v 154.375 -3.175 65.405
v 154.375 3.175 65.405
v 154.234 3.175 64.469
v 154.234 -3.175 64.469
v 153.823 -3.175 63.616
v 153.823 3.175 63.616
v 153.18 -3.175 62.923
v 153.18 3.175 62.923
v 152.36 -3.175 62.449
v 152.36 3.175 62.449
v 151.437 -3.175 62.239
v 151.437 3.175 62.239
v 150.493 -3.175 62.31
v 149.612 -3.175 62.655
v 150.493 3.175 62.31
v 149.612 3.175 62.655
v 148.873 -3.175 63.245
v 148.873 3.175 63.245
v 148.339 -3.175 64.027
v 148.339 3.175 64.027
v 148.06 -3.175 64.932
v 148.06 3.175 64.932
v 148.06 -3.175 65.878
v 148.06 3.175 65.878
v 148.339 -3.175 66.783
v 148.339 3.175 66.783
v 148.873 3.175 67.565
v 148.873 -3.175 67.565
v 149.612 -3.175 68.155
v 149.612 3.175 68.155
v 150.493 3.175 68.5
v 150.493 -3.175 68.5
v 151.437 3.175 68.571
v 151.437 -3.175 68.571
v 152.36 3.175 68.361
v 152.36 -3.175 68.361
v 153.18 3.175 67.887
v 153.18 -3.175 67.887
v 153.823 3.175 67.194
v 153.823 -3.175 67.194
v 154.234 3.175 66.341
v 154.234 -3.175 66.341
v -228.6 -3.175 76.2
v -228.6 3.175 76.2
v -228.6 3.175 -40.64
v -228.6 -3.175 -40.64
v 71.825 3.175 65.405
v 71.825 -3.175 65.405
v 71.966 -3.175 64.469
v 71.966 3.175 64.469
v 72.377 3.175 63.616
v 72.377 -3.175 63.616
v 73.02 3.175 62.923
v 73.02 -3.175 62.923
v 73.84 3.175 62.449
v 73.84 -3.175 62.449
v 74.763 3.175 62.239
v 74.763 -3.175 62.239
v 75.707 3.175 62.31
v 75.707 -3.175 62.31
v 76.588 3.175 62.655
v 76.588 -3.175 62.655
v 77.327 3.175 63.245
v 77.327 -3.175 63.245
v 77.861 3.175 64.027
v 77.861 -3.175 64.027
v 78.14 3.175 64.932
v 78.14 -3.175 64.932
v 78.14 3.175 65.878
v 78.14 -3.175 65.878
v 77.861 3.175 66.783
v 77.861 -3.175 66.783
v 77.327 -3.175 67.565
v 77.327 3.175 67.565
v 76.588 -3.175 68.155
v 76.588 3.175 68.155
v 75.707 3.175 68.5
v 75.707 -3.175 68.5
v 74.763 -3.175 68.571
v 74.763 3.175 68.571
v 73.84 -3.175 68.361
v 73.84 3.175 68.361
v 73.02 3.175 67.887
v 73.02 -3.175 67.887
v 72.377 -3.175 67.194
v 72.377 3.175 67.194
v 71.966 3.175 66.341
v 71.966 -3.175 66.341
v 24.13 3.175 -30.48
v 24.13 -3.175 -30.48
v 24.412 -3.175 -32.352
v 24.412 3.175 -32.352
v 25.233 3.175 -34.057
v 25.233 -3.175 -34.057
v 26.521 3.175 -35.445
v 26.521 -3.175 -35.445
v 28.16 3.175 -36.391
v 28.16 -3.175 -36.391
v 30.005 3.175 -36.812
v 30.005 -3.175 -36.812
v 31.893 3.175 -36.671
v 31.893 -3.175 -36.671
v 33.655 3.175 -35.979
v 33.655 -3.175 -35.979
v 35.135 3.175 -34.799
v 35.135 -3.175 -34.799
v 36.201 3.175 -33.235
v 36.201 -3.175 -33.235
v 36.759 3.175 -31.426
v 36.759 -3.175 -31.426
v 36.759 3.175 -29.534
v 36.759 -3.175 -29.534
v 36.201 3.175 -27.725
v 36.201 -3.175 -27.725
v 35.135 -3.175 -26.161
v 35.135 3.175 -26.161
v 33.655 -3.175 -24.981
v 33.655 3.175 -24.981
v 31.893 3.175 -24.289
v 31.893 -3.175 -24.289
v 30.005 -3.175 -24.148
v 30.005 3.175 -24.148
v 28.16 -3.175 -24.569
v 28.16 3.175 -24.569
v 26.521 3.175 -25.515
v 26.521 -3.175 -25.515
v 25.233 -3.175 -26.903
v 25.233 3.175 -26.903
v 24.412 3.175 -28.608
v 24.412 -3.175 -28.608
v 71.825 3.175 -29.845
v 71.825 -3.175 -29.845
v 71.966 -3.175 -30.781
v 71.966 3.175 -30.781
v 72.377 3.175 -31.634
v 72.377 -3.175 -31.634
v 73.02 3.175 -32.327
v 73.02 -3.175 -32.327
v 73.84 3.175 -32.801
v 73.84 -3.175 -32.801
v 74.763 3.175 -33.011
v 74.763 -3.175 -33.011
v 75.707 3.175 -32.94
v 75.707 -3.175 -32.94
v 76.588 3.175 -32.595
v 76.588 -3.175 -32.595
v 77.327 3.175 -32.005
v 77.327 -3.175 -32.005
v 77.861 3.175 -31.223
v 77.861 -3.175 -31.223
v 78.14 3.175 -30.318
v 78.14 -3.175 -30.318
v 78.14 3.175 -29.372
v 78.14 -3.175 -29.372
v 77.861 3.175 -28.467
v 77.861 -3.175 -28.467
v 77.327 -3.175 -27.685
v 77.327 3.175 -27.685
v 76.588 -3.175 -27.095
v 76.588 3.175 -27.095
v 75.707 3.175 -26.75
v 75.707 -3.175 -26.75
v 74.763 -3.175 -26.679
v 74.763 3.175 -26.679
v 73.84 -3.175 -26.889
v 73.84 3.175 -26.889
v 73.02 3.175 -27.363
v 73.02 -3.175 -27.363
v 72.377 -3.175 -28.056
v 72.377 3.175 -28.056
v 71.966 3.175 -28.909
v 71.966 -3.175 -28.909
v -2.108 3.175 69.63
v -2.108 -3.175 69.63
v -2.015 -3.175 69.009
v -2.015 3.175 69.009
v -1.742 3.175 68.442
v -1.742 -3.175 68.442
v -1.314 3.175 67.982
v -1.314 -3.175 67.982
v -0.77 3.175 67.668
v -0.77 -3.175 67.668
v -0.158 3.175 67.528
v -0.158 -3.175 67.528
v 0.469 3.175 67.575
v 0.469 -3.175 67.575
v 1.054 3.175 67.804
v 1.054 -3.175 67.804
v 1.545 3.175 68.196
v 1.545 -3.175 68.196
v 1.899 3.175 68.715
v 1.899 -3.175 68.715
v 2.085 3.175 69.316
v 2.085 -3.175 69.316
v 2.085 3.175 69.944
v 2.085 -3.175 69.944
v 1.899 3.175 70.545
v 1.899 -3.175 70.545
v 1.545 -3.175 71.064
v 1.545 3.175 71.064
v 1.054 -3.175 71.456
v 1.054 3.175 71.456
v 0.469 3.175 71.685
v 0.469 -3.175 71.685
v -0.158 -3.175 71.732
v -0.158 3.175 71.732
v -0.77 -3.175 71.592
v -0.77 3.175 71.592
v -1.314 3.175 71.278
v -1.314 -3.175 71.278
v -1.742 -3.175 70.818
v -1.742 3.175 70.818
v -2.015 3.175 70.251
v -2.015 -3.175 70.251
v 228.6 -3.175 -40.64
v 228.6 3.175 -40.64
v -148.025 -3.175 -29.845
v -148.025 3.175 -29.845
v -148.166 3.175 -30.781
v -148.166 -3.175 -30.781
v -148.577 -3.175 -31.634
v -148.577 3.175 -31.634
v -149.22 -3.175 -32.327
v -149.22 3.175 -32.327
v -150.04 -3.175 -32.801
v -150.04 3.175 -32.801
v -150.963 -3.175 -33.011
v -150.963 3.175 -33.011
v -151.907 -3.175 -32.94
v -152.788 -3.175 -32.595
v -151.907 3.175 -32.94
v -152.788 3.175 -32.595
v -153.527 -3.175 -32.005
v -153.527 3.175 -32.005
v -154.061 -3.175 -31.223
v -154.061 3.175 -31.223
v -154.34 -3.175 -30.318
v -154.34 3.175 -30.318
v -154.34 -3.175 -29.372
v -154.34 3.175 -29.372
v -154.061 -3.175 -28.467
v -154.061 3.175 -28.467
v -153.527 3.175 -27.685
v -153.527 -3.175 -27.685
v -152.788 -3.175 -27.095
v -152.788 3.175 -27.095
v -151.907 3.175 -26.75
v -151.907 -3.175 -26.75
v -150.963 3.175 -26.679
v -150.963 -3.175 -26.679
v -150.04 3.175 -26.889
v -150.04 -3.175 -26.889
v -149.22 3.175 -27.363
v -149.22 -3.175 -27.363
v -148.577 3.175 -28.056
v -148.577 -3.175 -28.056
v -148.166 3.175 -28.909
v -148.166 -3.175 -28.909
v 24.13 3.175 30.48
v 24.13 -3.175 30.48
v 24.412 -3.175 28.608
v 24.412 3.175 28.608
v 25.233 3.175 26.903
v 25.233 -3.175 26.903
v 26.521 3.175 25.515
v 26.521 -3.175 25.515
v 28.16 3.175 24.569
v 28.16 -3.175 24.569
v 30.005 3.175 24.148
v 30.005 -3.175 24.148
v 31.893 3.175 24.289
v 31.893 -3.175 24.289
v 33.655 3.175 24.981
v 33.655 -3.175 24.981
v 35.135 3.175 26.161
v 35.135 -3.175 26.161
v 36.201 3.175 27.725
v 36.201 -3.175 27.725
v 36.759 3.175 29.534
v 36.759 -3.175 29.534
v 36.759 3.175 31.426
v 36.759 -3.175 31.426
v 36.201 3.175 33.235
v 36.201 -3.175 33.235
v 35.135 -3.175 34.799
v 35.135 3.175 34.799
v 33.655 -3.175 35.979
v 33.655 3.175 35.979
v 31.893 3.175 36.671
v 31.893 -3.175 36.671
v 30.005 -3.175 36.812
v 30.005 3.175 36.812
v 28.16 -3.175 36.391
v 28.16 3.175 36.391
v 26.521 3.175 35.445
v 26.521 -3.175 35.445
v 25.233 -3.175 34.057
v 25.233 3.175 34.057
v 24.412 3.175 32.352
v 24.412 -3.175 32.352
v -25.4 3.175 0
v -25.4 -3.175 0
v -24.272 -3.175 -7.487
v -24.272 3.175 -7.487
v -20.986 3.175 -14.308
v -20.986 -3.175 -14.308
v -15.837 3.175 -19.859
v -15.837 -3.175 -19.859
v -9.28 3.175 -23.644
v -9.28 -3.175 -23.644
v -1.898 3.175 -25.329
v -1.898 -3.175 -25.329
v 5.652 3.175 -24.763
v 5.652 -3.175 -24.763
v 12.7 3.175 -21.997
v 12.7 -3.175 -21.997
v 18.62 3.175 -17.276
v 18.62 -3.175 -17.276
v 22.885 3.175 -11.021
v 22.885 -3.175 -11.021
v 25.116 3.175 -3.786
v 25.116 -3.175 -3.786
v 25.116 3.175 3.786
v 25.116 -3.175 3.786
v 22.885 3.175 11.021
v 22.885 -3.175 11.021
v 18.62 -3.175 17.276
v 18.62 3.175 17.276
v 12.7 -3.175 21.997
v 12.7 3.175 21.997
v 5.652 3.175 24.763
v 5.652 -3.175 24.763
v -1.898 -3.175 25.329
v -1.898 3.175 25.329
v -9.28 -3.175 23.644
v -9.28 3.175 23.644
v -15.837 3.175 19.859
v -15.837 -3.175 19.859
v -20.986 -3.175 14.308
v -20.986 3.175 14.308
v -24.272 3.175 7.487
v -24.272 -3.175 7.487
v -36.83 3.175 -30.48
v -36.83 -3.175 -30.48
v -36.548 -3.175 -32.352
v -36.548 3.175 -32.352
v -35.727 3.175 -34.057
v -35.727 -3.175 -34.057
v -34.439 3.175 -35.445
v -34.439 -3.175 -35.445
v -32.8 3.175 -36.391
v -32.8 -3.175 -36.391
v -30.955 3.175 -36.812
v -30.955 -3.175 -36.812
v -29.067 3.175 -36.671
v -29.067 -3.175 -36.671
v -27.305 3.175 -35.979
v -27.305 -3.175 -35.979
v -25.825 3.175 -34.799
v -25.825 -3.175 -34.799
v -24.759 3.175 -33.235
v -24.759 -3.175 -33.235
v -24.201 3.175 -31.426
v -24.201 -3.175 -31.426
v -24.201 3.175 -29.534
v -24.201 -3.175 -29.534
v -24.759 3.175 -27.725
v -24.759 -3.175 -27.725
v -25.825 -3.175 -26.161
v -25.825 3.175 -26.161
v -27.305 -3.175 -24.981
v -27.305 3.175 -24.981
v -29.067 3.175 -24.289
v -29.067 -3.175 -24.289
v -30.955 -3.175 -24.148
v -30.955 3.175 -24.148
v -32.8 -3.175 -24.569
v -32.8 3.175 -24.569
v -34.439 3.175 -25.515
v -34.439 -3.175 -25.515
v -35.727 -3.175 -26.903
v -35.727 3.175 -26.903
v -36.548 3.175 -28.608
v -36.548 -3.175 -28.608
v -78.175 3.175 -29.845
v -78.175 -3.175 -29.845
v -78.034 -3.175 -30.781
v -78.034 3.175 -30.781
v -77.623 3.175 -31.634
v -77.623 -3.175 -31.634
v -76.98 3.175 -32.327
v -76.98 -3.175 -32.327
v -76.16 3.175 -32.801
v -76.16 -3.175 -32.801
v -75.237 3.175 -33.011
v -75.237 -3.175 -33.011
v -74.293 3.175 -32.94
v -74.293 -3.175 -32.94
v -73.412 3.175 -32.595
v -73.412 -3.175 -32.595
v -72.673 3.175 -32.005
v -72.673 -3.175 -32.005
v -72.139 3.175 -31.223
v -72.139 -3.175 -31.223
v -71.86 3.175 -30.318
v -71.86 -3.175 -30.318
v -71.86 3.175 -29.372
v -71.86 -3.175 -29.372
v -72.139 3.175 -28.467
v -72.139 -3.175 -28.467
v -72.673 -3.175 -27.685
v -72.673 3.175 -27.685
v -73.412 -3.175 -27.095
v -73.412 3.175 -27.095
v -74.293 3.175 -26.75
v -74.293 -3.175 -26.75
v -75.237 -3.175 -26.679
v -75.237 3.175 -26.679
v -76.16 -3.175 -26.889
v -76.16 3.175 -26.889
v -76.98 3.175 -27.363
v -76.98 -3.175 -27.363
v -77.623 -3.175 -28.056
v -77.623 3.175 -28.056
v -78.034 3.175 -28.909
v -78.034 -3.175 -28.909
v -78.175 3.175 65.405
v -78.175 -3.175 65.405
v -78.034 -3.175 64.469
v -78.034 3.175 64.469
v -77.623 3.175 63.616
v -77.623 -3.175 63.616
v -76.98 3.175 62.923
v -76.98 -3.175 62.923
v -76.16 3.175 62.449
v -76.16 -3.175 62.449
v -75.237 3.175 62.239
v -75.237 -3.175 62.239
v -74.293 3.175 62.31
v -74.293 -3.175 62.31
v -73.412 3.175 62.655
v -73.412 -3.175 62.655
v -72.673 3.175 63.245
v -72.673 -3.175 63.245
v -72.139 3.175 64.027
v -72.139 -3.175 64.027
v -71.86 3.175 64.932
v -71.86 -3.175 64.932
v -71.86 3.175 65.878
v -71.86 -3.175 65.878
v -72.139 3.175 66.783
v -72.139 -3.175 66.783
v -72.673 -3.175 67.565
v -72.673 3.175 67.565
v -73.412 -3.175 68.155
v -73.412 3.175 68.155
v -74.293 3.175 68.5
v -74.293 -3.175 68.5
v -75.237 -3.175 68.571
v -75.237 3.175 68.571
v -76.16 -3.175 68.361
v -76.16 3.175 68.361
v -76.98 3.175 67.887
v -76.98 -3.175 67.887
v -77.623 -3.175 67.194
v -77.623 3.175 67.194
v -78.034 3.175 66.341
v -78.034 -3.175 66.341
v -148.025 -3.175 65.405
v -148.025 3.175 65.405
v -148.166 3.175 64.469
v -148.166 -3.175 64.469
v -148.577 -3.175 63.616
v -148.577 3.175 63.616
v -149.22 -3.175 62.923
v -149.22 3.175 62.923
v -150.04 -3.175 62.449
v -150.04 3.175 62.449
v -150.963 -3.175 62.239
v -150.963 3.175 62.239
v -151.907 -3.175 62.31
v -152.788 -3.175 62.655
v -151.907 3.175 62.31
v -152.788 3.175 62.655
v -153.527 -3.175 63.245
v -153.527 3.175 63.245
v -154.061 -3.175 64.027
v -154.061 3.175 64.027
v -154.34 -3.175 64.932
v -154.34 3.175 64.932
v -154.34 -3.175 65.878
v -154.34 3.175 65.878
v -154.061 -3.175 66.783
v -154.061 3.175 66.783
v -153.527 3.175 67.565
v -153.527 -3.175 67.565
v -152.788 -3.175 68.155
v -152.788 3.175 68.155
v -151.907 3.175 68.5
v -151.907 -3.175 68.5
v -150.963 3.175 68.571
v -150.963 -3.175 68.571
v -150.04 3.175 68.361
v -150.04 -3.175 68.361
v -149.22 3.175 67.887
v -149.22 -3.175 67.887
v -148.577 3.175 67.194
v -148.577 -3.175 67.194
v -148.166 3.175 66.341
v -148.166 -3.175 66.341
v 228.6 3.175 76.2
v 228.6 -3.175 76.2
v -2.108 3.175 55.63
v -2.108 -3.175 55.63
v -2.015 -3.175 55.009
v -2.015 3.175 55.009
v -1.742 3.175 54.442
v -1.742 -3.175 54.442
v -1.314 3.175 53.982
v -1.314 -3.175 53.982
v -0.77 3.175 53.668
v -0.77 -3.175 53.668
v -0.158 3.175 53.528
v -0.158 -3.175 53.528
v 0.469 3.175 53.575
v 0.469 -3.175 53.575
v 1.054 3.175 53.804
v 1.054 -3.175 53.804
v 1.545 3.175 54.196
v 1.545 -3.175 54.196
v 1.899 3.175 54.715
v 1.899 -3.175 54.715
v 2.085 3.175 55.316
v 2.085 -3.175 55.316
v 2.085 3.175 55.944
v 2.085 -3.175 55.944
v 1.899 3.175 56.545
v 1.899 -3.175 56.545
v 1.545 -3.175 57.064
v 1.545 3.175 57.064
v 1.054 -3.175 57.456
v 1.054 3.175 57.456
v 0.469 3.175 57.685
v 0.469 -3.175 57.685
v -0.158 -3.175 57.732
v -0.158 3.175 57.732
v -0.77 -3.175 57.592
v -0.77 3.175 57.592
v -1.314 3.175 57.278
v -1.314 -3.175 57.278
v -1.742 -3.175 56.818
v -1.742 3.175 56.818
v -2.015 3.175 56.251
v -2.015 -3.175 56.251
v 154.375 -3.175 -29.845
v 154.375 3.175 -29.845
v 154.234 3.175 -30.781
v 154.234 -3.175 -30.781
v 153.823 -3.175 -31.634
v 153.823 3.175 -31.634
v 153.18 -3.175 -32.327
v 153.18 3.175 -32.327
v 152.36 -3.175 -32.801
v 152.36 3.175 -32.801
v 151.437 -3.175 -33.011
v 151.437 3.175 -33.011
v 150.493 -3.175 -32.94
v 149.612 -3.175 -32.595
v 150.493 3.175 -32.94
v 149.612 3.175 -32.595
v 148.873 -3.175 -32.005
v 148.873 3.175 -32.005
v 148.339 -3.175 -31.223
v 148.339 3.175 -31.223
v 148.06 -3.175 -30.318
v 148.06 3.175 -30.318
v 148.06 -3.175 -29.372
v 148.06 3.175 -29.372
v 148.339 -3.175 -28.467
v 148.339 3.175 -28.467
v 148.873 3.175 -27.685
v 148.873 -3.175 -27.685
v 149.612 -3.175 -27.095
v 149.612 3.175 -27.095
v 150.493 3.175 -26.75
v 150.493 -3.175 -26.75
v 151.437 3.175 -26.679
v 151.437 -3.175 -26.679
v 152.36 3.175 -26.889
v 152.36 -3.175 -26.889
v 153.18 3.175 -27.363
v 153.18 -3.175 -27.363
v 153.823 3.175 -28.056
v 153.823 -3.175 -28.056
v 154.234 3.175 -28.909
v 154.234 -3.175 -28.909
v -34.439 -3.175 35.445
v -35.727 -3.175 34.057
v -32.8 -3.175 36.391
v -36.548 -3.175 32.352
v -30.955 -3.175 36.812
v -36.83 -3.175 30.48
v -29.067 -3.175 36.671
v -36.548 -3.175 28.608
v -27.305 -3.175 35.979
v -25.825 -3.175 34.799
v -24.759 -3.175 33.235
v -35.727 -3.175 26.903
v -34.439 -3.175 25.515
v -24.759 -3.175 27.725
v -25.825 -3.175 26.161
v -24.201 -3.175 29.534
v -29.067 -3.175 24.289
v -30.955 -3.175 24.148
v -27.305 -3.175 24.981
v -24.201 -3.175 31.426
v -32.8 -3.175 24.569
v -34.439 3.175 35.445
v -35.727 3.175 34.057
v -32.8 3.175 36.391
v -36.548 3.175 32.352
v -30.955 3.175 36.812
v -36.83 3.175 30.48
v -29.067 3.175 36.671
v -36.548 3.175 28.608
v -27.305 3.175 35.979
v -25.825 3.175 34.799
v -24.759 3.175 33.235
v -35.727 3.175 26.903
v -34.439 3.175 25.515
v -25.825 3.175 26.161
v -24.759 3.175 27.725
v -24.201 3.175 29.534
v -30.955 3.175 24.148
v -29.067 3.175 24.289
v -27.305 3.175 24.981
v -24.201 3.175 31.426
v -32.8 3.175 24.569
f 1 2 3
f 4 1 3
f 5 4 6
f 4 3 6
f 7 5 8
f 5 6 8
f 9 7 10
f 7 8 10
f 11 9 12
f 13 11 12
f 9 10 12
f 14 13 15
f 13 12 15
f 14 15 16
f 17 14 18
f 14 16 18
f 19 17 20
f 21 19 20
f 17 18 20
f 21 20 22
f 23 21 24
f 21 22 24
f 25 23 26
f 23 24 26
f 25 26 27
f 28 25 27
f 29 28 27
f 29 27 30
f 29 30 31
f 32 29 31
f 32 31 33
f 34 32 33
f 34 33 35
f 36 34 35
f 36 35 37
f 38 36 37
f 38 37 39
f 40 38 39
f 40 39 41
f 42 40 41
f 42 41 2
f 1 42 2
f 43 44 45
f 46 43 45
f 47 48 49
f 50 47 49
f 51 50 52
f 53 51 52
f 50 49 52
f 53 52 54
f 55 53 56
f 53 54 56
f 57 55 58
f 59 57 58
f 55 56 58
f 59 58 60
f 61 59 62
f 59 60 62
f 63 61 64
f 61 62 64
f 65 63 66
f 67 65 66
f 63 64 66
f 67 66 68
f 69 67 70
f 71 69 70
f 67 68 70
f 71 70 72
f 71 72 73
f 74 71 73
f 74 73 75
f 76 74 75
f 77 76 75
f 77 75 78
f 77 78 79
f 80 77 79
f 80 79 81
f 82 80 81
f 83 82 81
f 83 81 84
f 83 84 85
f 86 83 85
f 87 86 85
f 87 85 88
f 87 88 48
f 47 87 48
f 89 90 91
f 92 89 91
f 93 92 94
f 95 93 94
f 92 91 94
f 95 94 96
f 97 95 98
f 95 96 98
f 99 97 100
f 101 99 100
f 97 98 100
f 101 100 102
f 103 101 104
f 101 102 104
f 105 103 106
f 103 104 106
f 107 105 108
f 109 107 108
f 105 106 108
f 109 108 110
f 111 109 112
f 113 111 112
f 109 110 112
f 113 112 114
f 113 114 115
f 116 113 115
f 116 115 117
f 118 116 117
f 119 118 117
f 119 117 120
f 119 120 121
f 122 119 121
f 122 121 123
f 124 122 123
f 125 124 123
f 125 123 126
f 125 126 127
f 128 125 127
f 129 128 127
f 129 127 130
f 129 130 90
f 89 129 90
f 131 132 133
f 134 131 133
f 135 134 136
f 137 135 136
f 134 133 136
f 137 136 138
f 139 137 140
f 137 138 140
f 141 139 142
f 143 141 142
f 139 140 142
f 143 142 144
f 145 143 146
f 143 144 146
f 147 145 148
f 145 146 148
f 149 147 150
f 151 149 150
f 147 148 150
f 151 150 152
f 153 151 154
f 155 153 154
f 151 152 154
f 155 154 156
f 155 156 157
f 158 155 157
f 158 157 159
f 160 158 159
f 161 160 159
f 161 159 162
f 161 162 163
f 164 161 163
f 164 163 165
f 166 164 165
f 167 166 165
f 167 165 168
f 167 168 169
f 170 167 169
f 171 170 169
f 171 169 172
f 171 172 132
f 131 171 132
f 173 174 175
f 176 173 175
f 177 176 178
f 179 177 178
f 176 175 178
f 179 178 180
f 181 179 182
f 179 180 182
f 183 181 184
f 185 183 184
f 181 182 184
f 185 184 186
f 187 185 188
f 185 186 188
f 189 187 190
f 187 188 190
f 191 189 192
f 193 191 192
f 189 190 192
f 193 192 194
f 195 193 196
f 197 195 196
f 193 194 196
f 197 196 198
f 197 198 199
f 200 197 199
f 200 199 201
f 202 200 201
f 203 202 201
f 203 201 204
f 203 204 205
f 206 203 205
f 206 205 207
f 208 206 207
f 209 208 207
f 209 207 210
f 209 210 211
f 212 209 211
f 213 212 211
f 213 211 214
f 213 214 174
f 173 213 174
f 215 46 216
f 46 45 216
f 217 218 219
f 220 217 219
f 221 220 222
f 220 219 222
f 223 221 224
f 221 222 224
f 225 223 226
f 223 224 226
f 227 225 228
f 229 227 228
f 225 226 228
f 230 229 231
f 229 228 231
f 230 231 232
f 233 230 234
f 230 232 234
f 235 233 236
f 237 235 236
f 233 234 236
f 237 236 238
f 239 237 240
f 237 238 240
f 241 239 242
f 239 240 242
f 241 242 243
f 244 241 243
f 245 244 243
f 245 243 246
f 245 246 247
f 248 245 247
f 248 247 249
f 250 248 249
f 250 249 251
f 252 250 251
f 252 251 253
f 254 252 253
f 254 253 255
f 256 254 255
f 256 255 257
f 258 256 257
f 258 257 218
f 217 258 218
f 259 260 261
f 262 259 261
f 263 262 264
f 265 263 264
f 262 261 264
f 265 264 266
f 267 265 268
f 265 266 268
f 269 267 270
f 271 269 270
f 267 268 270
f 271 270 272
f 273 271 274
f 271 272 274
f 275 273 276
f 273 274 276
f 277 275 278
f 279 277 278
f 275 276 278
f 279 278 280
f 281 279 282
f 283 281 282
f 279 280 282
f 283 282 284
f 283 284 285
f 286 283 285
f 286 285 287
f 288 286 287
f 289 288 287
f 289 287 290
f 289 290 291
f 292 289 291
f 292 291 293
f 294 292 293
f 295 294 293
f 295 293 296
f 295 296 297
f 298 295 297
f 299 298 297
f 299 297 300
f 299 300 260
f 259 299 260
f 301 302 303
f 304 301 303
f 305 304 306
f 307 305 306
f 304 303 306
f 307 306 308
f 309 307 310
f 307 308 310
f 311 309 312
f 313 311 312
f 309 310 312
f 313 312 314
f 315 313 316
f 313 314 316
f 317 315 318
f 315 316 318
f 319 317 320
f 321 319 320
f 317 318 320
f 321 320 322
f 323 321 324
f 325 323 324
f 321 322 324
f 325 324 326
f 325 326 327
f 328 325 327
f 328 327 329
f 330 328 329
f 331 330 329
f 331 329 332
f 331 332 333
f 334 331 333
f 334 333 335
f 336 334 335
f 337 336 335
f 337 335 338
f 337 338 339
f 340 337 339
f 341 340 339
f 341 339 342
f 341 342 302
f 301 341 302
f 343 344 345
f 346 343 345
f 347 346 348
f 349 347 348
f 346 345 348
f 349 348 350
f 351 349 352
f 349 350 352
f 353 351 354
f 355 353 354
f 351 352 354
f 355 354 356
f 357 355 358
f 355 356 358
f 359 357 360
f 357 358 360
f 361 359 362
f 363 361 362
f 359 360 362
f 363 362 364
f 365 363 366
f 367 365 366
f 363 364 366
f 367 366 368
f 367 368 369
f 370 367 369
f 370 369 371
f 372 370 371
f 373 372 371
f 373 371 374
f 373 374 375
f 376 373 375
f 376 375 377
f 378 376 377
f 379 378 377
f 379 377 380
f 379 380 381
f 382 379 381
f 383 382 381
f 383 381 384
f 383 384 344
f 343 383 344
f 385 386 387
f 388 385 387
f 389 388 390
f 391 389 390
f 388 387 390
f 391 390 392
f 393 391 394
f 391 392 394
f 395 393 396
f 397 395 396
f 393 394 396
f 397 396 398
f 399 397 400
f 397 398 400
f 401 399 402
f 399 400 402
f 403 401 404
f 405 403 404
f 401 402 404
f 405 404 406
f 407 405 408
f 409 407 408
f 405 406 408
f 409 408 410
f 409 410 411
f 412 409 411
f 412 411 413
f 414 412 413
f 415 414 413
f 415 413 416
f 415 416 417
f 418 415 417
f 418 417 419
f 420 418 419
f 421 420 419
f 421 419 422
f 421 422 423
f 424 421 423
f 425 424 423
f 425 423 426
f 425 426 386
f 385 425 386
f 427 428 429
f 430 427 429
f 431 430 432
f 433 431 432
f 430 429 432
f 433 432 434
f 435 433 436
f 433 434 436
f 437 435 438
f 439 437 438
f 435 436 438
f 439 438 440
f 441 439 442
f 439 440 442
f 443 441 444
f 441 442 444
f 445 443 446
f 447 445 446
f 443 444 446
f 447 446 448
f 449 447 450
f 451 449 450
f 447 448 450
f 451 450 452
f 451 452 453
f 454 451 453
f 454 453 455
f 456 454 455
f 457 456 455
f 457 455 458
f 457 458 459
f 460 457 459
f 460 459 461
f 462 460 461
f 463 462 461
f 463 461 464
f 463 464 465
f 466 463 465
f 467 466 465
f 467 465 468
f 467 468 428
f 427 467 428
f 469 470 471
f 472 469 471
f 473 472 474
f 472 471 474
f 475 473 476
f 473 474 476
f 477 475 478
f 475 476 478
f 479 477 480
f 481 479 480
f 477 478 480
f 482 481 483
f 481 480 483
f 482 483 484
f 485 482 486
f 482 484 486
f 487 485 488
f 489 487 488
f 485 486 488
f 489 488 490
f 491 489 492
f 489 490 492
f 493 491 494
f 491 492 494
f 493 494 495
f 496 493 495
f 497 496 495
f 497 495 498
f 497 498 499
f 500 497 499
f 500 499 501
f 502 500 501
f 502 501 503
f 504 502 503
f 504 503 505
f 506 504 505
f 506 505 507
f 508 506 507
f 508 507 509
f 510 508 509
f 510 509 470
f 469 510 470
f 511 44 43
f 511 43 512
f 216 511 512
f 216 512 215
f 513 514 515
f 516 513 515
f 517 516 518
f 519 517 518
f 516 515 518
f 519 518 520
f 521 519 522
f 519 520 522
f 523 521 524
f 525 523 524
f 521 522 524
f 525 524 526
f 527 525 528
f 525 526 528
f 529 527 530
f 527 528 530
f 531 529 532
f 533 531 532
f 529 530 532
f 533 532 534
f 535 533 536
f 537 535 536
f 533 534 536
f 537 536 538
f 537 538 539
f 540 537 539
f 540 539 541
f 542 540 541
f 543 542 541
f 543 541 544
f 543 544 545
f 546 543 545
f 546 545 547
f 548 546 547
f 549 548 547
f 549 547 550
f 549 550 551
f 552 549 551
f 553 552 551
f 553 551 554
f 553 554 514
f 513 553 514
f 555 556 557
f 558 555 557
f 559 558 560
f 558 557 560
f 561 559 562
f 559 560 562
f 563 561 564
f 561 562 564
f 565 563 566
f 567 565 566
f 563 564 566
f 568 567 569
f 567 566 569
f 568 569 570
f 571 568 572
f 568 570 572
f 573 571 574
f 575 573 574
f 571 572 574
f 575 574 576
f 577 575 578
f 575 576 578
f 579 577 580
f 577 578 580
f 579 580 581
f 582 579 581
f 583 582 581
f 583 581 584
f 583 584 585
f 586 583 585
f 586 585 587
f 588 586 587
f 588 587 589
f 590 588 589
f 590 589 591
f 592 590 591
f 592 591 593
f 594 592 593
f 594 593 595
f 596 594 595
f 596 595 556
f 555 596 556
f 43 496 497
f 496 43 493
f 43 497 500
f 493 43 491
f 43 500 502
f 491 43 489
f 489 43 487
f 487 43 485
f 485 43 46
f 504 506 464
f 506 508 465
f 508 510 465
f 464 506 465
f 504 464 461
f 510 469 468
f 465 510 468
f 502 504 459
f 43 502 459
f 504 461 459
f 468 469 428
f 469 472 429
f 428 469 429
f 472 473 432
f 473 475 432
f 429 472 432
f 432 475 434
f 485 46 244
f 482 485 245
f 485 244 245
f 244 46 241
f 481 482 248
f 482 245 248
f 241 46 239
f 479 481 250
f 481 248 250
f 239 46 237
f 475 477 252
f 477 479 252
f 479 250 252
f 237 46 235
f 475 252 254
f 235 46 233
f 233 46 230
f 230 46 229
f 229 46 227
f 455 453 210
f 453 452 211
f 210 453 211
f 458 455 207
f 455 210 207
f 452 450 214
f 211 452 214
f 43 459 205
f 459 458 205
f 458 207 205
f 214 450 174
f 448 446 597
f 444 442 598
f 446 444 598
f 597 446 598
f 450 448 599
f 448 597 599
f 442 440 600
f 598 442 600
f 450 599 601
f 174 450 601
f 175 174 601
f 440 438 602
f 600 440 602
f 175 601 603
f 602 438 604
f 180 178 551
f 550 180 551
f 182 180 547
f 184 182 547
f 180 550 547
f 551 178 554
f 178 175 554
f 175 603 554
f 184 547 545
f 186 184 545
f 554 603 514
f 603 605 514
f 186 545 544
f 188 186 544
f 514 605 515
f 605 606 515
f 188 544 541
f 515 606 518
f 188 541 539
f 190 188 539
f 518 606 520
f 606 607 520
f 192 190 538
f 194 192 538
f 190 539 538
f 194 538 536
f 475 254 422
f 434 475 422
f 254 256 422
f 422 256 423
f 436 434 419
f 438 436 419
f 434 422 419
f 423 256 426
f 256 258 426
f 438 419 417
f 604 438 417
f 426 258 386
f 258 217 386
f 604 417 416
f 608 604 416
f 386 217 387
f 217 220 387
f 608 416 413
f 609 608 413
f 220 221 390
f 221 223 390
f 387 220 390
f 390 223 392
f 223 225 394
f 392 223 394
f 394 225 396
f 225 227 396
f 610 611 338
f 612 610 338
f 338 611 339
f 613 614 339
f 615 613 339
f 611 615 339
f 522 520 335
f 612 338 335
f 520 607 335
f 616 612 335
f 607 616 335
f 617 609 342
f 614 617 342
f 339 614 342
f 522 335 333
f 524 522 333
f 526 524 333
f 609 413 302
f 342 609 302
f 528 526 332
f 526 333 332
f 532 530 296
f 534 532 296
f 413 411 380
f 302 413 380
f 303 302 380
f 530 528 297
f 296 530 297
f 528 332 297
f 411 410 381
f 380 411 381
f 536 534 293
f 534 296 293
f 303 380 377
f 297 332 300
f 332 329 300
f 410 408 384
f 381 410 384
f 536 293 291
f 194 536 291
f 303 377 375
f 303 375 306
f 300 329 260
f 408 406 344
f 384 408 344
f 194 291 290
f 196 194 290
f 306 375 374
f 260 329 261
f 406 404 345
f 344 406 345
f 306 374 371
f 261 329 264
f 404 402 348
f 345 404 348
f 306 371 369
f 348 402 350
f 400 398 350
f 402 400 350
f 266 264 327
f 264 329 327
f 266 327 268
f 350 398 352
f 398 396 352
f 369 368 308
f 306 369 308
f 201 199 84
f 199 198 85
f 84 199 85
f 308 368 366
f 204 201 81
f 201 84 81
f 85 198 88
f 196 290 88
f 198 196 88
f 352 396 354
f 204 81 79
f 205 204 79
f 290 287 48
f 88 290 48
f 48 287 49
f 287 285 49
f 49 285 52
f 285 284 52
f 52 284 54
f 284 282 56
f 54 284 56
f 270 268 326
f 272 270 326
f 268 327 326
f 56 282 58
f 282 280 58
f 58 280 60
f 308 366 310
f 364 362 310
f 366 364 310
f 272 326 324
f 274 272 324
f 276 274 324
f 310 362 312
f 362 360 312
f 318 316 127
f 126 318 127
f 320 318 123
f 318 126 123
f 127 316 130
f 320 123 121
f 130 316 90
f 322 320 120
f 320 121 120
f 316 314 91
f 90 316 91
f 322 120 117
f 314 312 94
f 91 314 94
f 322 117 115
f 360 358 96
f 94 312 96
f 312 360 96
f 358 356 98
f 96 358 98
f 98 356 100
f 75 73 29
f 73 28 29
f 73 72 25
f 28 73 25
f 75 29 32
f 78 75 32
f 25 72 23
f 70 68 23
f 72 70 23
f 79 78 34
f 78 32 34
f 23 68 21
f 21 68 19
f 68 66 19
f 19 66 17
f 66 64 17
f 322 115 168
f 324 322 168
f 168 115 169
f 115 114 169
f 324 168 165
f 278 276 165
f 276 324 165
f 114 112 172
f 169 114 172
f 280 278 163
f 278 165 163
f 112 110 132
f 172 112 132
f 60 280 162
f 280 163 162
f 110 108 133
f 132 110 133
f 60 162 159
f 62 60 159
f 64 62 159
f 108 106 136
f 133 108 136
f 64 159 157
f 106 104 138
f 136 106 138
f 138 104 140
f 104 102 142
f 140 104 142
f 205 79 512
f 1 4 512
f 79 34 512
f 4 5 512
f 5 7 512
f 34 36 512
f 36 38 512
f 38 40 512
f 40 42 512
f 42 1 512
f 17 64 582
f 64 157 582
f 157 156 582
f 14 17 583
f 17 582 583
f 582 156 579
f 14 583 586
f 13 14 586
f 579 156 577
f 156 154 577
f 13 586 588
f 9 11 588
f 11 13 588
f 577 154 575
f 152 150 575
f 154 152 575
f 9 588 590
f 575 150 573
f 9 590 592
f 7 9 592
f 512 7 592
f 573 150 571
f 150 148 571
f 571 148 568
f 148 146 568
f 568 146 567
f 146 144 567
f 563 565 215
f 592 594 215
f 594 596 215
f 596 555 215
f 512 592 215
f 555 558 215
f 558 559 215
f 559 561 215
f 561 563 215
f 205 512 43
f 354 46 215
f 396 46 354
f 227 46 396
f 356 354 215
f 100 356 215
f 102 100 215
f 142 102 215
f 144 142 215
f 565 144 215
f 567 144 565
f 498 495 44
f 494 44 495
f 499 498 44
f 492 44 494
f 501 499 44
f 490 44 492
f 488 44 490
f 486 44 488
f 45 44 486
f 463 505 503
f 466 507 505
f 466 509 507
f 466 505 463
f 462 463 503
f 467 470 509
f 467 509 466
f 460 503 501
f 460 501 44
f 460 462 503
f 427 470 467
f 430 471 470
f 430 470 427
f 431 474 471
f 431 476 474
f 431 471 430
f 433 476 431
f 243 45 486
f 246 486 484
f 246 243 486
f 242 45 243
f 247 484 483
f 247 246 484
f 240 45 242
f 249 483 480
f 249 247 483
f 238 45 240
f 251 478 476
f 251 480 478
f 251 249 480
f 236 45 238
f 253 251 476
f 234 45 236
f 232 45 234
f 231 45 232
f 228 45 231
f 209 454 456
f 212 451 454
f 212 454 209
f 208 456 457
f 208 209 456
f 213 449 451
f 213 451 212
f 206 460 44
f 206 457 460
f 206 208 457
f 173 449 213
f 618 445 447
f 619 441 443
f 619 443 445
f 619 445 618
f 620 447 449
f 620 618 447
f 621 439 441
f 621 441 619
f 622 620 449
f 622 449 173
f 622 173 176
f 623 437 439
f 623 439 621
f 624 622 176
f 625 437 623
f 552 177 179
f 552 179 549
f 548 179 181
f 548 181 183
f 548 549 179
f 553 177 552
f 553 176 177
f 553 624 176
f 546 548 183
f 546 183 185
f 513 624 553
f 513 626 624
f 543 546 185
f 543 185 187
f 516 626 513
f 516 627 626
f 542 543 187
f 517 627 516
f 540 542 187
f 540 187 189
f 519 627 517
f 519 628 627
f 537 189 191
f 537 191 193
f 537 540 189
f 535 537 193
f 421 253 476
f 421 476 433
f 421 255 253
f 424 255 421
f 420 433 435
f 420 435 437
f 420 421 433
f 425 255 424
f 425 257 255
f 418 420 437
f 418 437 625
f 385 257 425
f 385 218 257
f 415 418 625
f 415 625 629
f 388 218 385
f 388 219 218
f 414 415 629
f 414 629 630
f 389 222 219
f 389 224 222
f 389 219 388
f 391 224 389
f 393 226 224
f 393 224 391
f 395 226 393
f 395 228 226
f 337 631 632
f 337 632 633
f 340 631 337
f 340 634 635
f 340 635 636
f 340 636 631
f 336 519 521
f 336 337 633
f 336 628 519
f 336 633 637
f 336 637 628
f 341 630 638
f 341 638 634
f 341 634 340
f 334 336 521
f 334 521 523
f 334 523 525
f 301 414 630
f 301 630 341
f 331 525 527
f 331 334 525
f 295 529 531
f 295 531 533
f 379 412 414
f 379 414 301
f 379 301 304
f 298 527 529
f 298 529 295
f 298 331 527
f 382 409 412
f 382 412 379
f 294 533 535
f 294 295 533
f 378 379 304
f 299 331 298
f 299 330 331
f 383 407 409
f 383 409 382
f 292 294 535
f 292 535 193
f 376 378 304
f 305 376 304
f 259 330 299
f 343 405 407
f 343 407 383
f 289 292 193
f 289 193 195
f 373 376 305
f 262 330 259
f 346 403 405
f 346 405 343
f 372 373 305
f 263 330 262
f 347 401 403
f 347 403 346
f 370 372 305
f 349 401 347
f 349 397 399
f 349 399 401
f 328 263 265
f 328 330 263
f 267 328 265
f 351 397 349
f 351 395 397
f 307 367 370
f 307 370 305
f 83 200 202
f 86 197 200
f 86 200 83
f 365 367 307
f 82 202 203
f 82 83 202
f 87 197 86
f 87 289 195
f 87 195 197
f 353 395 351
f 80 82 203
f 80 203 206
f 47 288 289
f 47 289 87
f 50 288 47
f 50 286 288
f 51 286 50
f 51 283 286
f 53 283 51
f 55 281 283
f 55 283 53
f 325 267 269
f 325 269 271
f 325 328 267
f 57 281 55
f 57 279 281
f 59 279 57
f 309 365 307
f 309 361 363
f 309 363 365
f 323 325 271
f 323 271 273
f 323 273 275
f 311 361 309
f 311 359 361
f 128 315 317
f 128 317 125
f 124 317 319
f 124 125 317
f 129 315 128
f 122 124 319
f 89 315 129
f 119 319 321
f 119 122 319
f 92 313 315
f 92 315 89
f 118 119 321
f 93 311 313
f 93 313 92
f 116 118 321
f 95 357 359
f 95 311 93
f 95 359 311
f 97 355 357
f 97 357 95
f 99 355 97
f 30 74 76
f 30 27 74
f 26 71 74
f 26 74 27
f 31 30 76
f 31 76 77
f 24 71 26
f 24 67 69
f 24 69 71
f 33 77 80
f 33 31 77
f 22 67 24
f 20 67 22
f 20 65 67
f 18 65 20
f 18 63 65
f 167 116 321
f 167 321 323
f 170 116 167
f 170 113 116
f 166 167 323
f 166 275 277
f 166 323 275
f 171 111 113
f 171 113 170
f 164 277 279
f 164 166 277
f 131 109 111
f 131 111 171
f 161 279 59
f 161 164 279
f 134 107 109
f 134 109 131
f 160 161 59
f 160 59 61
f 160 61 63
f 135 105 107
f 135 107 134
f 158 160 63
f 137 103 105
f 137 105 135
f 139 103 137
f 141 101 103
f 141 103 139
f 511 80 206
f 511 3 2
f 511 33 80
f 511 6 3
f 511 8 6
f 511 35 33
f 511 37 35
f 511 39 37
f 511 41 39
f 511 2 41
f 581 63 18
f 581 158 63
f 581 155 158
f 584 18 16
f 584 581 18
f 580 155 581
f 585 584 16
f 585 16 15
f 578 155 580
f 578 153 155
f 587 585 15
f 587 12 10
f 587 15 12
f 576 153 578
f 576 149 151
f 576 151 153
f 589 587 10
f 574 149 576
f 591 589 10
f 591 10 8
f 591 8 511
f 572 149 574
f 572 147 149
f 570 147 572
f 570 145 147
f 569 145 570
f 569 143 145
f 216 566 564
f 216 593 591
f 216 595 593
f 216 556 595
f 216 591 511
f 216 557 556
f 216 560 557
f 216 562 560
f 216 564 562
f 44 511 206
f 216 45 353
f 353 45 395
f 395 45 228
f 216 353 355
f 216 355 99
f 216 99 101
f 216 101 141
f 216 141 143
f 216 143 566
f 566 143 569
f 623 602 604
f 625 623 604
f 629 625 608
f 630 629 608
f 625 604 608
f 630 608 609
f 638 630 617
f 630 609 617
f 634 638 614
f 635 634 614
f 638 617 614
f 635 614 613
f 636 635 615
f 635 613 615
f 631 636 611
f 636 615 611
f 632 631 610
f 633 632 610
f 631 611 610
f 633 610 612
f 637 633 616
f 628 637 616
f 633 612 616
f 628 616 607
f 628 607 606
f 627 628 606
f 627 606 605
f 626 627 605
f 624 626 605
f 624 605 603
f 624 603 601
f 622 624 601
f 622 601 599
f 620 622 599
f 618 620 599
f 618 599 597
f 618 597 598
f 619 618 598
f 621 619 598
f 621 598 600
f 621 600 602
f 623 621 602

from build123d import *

# Parameters (mm, degrees)
SKETCH1_W                   = 457.2
SKETCH1_H                   = 116.84
BOSS_EXTRUDE1_DEPTH         = 3.175
F_1_1_DIAMETER_HOLE1_D      = 50.8
F_1_2_0_5_DIAMETER_HOLE1_D  = 12.7
F_4_0_4_DIAMETER_HOLE1_D    = 4.2164
F_1_4_0_25_DIAMETER_HOLE1_D = 6.35
AUX_CLEARANCE_HOLES_REACH   = 8.35
SKETCH11_R                  = 3.175


with BuildPart() as part:
    # Sketch1 → Boss-Extrude1 (new body, symmetric)
    with BuildSketch(Plane(origin=(0, 0, 0), x_dir=(1, 0, 0), z_dir=(0, 1, 0))):
        with Locations((0, -17.78)):
            Rectangle(SKETCH1_W, SKETCH1_H)
    extrude(amount=BOSS_EXTRUDE1_DEPTH, both=True)

    # 1 (1) Diameter Hole1 (through all)
    with Locations(Plane(origin=(0, 3.175, 0), x_dir=(1, 0, 0), z_dir=(0, 1, 0))):
        with Locations((0, 0)):
            Hole(F_1_1_DIAMETER_HOLE1_D / 2)

    # 1/2 (0.5) Diameter Hole1 (through all)
    with Locations(Plane(origin=(0, 3.175, 0), x_dir=(1, 0, 0), z_dir=(0, 1, 0))):
        with Locations((30.48, -30.48), (-30.48, 30.48), (-30.48, -30.48), (30.48, 30.48)):
            Hole(F_1_2_0_5_DIAMETER_HOLE1_D / 2)

    # Ø4.0 (4) Diameter Hole1 (through all)
    with Locations(Plane(origin=(0, 3.175, 0), x_dir=(1, 0, 0), z_dir=(0, 1, 0))):
        with Locations((0, -55.63), (0, -69.63)):
            Hole(F_4_0_4_DIAMETER_HOLE1_D / 2)

    # 1/4 (0.25) Diameter Hole1 (through all)
    with Locations(Plane(origin=(0, 3.175, 0), x_dir=(1, 0, 0), z_dir=(0, 1, 0))):
        with Locations((75, -65.405), (-75, 29.845), (-75, -65.405), (75, 29.845)):
            Hole(F_1_4_0_25_DIAMETER_HOLE1_D / 2)

    # Sketch11 → Aux Clearance holes (cut, up to next)
    with BuildSketch(Plane(origin=(0, 3.175, 0), x_dir=(1, 0, 0), z_dir=(0, 1, 0)), mode=Mode.PRIVATE) as aux_clearance_holes_sk1:
        with Locations((-151.2, 29.845)):
            Circle(SKETCH11_R)
    aux_clearance_holes_tool1 = extrude(aux_clearance_holes_sk1.sketch, amount=-AUX_CLEARANCE_HOLES_REACH, mode=Mode.PRIVATE) & part.part
    add(aux_clearance_holes_tool1.solids().sort_by_distance((-151.2, 3.175, -29.845))[0], mode=Mode.SUBTRACT)
    # Sketch11 → Aux Clearance holes (cut, up to next)
    with BuildSketch(Plane(origin=(0, 3.175, 0), x_dir=(1, 0, 0), z_dir=(0, 1, 0)), mode=Mode.PRIVATE) as aux_clearance_holes_sk2:
        with Locations((-151.2, -65.405)):
            Circle(SKETCH11_R)
    aux_clearance_holes_tool2 = extrude(aux_clearance_holes_sk2.sketch, amount=-AUX_CLEARANCE_HOLES_REACH, mode=Mode.PRIVATE) & part.part
    add(aux_clearance_holes_tool2.solids().sort_by_distance((-151.2, 3.175, 65.405))[0], mode=Mode.SUBTRACT)
    # Sketch11 → Aux Clearance holes (cut, up to next)
    with BuildSketch(Plane(origin=(0, 3.175, 0), x_dir=(1, 0, 0), z_dir=(0, 1, 0)), mode=Mode.PRIVATE) as aux_clearance_holes_sk3:
        with Locations((151.2, 29.845)):
            Circle(SKETCH11_R)
    aux_clearance_holes_tool3 = extrude(aux_clearance_holes_sk3.sketch, amount=-AUX_CLEARANCE_HOLES_REACH, mode=Mode.PRIVATE) & part.part
    add(aux_clearance_holes_tool3.solids().sort_by_distance((151.2, 3.175, -29.845))[0], mode=Mode.SUBTRACT)
    # Sketch11 → Aux Clearance holes (cut, up to next)
    with BuildSketch(Plane(origin=(0, 3.175, 0), x_dir=(1, 0, 0), z_dir=(0, 1, 0)), mode=Mode.PRIVATE) as aux_clearance_holes_sk4:
        with Locations((151.2, -65.405)):
            Circle(SKETCH11_R)
    aux_clearance_holes_tool4 = extrude(aux_clearance_holes_sk4.sketch, amount=-AUX_CLEARANCE_HOLES_REACH, mode=Mode.PRIVATE) & part.part
    add(aux_clearance_holes_tool4.solids().sort_by_distance((151.2, 3.175, 65.405))[0], mode=Mode.SUBTRACT)


solid = part.part
